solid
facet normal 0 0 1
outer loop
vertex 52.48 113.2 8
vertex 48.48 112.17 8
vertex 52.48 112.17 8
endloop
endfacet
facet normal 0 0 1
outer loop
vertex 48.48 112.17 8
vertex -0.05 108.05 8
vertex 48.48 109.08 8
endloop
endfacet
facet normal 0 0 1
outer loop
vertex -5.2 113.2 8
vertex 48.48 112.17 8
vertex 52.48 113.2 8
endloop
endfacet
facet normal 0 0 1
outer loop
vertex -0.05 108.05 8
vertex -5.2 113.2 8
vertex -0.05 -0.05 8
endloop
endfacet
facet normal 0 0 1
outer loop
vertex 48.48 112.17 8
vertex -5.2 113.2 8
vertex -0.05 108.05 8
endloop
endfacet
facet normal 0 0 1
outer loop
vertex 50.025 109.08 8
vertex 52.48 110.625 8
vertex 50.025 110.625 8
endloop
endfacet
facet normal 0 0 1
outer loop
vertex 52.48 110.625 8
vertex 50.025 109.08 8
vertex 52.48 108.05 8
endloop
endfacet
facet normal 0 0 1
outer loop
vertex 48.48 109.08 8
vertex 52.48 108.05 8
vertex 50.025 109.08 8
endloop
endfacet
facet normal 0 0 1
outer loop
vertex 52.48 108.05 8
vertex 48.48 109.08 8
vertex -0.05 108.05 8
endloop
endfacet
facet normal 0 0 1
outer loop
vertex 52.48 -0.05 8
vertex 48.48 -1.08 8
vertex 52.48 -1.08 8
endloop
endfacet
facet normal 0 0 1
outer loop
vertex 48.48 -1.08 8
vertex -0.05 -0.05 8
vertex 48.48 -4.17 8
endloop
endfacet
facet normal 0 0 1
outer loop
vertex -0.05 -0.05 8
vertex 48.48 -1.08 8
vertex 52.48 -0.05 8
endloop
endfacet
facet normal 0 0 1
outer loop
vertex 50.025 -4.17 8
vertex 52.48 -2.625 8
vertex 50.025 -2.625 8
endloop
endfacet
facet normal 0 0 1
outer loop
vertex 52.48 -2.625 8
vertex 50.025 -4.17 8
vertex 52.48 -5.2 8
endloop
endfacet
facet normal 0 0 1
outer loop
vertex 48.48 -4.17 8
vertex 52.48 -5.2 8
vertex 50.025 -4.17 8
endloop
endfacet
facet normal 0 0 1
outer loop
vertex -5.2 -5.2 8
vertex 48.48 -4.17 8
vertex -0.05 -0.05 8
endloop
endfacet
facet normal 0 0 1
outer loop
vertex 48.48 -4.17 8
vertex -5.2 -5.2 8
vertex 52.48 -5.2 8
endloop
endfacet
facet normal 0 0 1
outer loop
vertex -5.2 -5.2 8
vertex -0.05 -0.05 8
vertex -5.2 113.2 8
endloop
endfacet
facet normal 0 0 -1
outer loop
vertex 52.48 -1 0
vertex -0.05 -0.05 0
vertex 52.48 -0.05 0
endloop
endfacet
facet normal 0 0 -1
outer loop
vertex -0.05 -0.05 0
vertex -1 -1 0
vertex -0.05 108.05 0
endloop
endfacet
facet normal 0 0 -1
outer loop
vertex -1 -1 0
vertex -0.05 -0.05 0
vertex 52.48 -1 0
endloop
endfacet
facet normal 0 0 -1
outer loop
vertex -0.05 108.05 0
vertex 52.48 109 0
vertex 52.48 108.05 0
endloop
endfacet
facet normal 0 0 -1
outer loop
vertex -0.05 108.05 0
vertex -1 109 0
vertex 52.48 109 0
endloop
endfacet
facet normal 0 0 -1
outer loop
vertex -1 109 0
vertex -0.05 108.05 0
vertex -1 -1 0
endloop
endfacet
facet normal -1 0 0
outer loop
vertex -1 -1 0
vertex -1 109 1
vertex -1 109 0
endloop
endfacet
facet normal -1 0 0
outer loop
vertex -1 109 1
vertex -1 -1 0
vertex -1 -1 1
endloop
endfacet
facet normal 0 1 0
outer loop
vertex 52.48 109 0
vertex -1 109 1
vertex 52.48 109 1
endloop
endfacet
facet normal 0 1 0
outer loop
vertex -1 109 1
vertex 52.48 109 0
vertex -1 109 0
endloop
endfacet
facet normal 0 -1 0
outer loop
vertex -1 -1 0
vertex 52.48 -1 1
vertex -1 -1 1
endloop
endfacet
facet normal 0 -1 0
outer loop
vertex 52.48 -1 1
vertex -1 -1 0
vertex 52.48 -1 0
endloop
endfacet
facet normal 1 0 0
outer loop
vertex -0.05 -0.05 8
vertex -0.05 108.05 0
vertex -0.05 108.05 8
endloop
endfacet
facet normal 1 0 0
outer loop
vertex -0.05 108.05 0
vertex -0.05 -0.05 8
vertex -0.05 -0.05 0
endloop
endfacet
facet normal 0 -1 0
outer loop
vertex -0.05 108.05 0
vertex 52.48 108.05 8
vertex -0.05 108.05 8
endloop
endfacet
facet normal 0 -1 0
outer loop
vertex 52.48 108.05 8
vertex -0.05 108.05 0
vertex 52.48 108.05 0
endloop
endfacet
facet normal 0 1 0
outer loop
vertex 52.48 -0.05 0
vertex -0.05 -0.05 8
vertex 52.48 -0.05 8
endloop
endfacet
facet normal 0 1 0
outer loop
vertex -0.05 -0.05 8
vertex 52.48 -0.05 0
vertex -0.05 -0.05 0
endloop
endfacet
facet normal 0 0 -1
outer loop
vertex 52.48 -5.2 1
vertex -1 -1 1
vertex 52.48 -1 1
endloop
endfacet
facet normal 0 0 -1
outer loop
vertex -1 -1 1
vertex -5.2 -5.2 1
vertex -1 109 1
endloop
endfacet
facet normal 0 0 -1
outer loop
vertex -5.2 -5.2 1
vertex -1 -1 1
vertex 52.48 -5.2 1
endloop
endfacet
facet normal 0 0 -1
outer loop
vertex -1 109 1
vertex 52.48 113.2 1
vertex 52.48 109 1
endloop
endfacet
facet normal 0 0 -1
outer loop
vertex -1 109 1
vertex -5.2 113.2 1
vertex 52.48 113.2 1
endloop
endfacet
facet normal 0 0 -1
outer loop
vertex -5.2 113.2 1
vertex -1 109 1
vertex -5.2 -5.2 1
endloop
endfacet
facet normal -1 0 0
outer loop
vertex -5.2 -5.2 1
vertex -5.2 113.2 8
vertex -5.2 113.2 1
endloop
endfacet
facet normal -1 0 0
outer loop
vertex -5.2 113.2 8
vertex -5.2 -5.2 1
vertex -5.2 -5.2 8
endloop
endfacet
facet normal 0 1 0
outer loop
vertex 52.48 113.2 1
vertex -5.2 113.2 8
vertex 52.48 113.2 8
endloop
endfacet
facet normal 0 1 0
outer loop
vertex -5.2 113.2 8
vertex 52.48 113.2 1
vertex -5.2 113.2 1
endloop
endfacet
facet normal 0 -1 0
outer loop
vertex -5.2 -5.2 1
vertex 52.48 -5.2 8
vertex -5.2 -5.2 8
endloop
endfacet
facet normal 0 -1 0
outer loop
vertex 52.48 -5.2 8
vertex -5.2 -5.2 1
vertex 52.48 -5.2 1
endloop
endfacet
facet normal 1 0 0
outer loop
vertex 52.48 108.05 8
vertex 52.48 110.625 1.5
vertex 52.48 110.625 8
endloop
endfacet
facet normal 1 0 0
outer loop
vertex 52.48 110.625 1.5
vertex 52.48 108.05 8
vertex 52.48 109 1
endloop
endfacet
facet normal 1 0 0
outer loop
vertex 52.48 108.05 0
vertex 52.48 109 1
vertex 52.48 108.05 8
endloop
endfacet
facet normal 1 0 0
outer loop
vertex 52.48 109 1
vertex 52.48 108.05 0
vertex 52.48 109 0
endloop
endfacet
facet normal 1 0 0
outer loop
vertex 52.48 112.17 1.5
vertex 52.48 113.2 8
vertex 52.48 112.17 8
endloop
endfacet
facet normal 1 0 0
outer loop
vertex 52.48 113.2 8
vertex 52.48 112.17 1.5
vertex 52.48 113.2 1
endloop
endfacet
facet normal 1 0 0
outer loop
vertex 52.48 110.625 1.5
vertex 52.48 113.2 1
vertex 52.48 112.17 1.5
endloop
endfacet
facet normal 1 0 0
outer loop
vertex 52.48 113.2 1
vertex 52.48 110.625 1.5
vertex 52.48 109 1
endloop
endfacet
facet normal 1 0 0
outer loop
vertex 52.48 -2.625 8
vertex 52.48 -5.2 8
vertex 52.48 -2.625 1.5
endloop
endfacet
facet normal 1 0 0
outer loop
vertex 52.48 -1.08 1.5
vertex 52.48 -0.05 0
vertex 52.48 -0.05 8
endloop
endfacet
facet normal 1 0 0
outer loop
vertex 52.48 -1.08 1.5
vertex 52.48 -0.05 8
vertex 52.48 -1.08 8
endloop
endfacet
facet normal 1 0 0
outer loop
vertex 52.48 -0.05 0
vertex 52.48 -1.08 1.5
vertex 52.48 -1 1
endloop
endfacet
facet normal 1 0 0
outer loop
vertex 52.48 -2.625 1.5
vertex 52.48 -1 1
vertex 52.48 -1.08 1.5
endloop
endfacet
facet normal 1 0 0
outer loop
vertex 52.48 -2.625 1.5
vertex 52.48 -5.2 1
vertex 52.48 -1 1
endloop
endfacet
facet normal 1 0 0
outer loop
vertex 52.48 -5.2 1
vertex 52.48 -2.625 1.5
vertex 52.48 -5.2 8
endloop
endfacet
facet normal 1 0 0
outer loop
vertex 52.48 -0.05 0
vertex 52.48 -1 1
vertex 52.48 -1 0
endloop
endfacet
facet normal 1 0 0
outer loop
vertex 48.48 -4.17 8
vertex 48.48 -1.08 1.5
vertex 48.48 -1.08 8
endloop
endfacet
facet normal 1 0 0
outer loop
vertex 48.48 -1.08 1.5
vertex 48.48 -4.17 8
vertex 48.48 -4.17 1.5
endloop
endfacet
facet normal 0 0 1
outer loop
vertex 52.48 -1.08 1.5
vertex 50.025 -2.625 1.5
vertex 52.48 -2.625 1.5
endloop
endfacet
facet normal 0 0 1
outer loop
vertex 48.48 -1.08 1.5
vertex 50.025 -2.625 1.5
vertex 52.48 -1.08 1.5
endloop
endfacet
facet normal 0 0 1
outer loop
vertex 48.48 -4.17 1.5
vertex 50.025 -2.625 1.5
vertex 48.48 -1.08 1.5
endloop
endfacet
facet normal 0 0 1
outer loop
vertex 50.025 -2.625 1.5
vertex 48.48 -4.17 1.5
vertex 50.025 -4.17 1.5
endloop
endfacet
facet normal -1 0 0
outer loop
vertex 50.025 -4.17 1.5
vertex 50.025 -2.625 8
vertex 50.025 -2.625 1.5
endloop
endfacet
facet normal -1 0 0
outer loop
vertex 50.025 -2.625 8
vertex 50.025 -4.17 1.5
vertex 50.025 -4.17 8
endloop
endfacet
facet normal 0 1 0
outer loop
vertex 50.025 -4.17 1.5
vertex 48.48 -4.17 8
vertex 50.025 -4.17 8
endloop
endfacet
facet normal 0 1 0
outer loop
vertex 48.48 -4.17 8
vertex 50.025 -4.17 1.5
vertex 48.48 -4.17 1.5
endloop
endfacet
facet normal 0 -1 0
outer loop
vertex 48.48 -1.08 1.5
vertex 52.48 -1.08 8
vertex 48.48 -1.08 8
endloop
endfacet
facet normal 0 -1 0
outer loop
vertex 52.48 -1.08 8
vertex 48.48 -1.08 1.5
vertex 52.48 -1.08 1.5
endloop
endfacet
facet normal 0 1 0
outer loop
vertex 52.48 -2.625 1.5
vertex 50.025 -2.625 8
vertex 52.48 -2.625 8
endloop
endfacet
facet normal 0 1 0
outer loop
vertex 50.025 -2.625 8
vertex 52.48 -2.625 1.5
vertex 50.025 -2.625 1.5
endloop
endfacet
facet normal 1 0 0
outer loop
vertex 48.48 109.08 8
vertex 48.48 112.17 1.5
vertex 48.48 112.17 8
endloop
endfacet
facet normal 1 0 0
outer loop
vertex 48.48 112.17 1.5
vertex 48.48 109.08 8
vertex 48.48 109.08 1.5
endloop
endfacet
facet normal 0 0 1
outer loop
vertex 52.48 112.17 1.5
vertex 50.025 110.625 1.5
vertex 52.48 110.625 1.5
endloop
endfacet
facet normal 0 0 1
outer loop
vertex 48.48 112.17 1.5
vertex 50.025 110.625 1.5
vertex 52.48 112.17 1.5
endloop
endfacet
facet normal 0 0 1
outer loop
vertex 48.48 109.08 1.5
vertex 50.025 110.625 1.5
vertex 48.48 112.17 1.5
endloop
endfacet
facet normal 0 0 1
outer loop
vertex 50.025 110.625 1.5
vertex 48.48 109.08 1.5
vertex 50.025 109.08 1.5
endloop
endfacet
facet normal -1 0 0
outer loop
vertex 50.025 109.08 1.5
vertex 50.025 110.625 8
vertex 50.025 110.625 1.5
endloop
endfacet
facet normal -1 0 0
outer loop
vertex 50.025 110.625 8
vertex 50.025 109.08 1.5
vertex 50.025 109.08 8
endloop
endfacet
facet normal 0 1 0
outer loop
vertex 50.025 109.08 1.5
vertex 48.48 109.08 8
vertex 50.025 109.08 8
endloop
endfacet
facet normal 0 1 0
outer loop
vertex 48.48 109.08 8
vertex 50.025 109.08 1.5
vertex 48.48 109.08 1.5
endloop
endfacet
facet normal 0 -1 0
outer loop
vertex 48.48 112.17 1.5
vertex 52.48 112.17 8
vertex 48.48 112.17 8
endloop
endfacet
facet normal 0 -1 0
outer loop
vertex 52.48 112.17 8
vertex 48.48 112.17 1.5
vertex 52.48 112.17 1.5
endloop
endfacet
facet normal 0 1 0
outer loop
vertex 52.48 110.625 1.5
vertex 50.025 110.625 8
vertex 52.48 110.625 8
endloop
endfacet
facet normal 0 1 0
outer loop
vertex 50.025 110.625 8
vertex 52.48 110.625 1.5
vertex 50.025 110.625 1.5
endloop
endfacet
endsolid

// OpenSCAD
// Generated by SolidPython 1.0.4 on 2021-07-12 16:52:22


difference() {
	difference() {
		difference() {
			union() {
				difference() {
					translate(v = [-1.0000000000, -1.0000000000, 0]) {
						cube(size = [74.0000000000, 110.0000000000, 8]);
					}
					translate(v = [-0.0500000000, -0.0500000000, 0]) {
						cube(size = [72.1000000000, 108.1000000000, 8]);
					}
				}
				translate(v = [0, 0, 1]) {
					difference() {
						translate(v = [-5.2000000000, -5.2000000000, 0]) {
							cube(size = [82.4000000000, 118.4000000000, 7]);
						}
						translate(v = [-1.0000000000, -1.0000000000, 0]) {
							cube(size = [74.0000000000, 110.0000000000, 7]);
						}
					}
				}
			}
			translate(v = [52.4800000000, -5.2000000000, 0]) {
				cube(size = [24.7200000000, 118.4000000000, 8]);
			}
		}
		translate(v = [48.4800000000, -4.1700000000, 0]) {
			translate(v = [0, 0, 1.5000000000]) {
				translate(v = [4, 3.0900000000, 0]) {
					rotate(a = -180) {
						union() {
							translate(v = [2.4550000000, 0, 0]) {
								cube(size = [1.5450000000, 3.0900000000, 6.5000000000]);
							}
							cube(size = [4, 1.5450000000, 6.5000000000]);
						}
					}
				}
			}
		}
	}
	translate(v = [48.4800000000, 109.0800000000, 0]) {
		translate(v = [0, 0, 1.5000000000]) {
			translate(v = [4, 3.0900000000, 0]) {
				rotate(a = -180) {
					union() {
						translate(v = [2.4550000000, 0, 0]) {
							cube(size = [1.5450000000, 3.0900000000, 6.5000000000]);
						}
						cube(size = [4, 1.5450000000, 6.5000000000]);
					}
				}
			}
		}
	}
}
